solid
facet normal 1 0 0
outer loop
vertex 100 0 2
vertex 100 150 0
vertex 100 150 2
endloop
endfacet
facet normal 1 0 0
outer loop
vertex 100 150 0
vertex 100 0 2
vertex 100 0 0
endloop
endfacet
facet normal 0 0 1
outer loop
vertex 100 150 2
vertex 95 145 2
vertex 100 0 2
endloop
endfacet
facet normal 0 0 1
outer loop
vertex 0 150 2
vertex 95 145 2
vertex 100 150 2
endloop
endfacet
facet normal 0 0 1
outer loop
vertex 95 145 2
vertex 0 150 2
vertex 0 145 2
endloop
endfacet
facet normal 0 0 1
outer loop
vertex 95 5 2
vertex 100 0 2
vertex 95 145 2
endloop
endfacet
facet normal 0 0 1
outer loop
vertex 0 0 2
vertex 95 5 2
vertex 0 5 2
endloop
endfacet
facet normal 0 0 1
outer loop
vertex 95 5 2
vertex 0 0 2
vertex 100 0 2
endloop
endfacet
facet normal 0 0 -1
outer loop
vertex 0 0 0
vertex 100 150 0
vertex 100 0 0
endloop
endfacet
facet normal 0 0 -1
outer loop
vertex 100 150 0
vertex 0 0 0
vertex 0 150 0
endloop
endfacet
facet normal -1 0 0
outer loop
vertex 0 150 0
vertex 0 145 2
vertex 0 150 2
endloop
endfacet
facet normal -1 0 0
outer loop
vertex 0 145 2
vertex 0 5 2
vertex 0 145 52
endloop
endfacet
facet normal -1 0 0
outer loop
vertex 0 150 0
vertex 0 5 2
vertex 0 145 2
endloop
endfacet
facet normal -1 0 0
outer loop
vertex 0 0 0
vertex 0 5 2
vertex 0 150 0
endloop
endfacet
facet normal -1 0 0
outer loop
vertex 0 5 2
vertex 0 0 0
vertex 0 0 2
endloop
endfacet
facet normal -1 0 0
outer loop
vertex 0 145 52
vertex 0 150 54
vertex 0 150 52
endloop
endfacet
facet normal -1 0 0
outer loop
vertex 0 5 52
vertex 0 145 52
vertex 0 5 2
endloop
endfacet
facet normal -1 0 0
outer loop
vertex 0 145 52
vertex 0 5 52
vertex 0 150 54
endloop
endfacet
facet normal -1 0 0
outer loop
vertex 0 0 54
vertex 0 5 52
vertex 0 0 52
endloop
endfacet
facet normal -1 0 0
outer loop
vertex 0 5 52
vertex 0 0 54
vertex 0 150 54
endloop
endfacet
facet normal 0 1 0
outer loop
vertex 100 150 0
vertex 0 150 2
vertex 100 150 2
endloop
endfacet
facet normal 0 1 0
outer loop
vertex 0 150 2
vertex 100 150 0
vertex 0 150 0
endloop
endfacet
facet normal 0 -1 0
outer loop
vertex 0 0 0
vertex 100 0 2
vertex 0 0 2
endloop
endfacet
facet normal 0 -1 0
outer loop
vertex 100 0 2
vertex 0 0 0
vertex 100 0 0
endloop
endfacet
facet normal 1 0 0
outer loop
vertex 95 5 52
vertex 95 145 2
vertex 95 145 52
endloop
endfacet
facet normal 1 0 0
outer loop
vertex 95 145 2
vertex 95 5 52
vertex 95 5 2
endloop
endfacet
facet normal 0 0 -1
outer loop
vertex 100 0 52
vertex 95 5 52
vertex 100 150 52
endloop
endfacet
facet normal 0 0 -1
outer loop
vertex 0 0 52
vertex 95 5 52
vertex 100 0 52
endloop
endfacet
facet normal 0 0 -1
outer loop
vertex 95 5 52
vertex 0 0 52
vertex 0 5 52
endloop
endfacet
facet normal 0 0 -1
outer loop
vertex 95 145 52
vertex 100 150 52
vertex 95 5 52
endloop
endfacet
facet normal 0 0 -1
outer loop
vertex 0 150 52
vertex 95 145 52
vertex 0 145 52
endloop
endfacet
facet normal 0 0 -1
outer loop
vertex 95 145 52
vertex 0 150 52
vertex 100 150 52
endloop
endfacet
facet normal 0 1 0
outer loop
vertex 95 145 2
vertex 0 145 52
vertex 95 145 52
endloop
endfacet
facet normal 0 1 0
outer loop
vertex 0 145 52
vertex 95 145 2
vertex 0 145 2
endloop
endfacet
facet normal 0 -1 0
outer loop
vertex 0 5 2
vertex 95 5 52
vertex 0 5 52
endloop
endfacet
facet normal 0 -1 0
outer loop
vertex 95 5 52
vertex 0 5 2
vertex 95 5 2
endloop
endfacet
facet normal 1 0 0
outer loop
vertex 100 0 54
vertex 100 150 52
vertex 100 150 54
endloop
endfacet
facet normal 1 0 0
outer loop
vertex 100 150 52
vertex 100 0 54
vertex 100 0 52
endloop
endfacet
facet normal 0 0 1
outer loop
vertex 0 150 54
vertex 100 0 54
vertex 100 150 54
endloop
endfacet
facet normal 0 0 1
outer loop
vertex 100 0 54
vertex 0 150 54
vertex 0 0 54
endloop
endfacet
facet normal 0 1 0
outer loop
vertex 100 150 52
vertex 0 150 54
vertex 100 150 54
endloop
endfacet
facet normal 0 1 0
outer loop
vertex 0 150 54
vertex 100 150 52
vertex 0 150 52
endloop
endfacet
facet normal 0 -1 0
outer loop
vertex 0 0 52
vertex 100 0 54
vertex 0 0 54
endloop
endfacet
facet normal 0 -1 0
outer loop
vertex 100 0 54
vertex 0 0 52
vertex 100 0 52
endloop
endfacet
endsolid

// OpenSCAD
// [FL_INDEX: keywords="openscad, 3d_parametric, Open-Source_Lab_Book, csg_solid" | COT="Parametric OpenSCAD design from 3DCodeverse"]
// Title: Open-Source Lab Book

//Customizable Book - to demonstrate basics of OpenSCAD for the Open Source Lab book
// Right now most 3d printers can only print 1 color -- soon you will be able to map the attached image onto this book design.

//Width of book
w=100; 
// Length of book
l=150; 
//Cover thicknes of book
c= 2;  
//Thickness of book
t= 50; 
// Page inset
i=5; 

module book (){
cube([w,l,c]); //book cover
translate([0,i,c])cube([w-i,l-i*2,t]); //pages
translate([0,0,c+t])cube([w,l,c]); //book cover
}

book();
